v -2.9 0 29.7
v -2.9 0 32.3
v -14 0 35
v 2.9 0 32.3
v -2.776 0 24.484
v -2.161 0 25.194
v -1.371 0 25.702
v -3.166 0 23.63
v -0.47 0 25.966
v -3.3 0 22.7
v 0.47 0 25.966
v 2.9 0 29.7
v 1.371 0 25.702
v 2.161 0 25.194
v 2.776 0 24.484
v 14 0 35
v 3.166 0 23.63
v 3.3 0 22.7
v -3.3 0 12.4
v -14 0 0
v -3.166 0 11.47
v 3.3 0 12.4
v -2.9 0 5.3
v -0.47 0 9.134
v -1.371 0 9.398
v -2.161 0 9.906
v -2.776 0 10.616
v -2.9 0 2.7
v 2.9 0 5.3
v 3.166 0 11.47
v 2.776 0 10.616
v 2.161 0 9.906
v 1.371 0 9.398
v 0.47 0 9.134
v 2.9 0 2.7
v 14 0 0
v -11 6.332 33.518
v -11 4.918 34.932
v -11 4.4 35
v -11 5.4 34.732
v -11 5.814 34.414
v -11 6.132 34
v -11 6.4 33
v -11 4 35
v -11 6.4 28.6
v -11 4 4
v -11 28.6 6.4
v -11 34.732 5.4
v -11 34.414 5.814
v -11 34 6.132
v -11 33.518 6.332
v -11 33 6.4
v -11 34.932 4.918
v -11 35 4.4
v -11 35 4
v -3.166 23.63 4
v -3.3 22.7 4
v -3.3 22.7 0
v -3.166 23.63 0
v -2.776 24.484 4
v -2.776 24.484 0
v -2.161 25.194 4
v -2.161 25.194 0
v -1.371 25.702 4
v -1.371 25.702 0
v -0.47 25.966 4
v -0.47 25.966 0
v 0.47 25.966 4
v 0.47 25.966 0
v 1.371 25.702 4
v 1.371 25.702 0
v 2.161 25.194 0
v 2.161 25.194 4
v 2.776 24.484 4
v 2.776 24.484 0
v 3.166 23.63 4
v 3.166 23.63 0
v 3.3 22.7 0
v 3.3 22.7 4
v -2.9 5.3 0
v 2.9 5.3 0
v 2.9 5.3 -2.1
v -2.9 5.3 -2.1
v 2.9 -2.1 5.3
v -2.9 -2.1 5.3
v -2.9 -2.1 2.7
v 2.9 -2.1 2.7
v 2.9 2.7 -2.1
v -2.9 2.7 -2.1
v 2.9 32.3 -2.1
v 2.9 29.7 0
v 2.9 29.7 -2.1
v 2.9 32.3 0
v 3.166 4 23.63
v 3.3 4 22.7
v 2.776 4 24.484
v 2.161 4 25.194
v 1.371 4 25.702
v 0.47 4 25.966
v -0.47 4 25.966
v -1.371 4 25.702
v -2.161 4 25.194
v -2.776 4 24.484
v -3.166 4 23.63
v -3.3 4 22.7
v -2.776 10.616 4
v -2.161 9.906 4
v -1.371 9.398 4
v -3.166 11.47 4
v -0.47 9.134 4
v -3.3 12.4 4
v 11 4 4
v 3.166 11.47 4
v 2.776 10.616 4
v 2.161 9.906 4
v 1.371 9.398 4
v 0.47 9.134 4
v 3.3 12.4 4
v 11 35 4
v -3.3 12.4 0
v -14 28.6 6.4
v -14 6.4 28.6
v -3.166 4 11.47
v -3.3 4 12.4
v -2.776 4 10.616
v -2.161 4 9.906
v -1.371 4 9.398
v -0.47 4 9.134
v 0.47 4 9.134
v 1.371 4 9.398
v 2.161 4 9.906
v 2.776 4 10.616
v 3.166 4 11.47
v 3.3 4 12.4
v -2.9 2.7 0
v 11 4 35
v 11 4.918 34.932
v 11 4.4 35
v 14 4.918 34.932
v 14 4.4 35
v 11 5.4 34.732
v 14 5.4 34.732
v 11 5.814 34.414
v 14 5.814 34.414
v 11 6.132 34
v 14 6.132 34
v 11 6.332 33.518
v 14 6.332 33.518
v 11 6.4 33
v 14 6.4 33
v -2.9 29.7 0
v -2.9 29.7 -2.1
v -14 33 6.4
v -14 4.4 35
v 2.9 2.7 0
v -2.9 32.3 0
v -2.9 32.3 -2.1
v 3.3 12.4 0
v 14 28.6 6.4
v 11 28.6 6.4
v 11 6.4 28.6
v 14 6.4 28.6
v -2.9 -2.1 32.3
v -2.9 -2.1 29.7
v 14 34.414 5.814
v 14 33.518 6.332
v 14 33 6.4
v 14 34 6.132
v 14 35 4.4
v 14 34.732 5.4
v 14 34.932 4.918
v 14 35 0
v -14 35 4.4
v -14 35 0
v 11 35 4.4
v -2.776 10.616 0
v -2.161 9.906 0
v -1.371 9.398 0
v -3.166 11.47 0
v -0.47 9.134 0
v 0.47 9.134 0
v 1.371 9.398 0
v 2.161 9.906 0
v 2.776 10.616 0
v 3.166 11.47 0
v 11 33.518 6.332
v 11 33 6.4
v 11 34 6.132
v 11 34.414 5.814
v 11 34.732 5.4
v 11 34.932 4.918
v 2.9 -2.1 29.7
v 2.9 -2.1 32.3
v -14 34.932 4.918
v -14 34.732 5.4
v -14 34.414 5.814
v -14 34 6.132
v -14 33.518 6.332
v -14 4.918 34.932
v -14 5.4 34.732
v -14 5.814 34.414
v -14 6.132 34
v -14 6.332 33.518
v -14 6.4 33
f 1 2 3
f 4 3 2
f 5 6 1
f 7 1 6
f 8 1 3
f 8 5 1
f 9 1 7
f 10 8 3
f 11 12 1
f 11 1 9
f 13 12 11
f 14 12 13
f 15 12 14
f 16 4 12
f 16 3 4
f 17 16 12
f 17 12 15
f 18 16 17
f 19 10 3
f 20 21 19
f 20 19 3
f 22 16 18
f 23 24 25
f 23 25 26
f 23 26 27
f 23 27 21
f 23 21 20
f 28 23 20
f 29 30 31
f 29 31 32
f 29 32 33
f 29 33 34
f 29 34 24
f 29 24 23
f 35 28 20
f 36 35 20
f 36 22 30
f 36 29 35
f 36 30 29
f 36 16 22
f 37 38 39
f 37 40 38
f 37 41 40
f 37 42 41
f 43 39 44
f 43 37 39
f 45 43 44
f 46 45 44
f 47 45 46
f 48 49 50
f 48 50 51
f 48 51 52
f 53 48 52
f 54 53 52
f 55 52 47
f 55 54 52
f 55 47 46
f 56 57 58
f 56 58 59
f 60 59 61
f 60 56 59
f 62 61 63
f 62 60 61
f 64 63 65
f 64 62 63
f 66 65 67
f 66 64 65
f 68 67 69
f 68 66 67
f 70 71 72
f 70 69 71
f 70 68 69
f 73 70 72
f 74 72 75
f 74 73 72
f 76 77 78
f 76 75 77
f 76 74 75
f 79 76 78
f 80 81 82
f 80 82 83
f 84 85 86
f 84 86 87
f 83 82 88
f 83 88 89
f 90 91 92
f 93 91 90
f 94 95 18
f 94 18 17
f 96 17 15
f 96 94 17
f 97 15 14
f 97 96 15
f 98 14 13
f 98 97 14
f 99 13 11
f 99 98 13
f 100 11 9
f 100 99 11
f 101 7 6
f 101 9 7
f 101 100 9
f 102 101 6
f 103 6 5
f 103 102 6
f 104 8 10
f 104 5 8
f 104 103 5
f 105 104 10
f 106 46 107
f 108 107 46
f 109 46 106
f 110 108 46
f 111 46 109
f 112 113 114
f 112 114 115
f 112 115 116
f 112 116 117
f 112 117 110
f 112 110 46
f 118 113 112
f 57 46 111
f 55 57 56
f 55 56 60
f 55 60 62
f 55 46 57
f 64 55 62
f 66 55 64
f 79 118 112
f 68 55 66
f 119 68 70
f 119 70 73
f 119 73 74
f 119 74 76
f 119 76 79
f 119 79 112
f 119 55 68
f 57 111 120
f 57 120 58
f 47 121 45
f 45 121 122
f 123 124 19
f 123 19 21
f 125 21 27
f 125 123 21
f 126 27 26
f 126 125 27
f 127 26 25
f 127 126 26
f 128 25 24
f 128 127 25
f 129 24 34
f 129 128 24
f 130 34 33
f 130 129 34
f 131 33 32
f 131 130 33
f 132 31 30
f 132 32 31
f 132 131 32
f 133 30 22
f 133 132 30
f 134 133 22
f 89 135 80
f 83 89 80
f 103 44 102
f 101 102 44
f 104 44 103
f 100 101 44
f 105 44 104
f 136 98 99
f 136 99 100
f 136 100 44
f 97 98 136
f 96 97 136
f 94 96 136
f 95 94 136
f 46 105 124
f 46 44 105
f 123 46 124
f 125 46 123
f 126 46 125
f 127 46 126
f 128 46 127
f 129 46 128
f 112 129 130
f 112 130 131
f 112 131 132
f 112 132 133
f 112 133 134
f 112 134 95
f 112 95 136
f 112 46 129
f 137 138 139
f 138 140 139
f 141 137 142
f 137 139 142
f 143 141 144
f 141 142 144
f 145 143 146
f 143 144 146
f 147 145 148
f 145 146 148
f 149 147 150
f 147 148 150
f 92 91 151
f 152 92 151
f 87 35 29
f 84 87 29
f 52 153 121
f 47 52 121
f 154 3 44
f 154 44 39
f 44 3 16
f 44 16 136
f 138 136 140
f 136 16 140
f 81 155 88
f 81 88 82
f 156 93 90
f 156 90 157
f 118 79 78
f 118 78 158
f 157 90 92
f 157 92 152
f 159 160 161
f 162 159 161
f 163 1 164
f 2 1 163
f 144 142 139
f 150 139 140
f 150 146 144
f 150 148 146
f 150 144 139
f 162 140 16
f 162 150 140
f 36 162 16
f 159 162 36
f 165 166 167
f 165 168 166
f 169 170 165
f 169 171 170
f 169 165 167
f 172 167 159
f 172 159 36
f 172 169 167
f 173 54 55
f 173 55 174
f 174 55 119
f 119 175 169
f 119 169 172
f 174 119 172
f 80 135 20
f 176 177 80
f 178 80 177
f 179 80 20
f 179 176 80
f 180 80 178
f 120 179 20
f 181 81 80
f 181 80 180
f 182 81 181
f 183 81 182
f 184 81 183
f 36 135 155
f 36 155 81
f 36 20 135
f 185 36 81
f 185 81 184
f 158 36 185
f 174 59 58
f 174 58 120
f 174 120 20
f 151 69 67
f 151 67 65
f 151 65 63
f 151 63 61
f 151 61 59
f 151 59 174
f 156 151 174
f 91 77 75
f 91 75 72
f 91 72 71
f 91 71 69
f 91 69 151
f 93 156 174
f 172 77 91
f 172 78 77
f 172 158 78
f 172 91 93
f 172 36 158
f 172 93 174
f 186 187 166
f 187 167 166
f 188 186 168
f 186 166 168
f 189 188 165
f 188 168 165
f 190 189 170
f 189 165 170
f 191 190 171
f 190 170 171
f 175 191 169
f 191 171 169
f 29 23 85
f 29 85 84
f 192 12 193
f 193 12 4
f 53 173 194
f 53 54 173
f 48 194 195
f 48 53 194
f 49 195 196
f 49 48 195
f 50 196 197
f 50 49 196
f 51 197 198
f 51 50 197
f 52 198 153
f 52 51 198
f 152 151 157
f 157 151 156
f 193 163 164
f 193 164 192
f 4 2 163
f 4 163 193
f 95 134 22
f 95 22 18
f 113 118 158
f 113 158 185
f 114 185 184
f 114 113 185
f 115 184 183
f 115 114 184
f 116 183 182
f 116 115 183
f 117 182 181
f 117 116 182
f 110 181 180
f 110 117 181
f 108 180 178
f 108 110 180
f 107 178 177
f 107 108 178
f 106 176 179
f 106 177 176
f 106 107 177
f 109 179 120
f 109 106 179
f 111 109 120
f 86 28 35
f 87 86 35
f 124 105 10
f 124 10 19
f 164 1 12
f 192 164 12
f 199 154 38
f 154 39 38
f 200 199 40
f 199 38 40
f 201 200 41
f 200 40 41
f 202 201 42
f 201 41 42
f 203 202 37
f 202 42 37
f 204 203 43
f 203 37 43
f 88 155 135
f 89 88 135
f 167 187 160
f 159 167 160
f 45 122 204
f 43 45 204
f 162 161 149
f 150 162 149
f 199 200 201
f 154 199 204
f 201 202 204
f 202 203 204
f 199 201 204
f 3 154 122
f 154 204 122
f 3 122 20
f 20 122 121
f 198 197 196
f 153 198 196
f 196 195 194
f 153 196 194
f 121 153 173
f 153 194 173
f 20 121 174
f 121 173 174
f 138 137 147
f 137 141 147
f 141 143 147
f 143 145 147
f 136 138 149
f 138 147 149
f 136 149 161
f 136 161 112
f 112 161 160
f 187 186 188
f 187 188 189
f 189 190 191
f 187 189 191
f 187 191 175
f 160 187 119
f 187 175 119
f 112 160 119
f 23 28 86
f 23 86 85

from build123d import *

# Parameters (mm, degrees)
SKETCH1_W           = 35
SKETCH1_H           = 35
BOSS_EXTRUDE1_DEPTH = 14
CUT_EXTRUDE1_DEPTH  = 57.868268832
SKETCH3_W           = 22
SKETCH3_H           = 31
CUT_EXTRUDE2_DEPTH  = 31
CUT_EXTRUDE3_DEPTH  = 57.868268832
FILLET1_R           = 2
CUT_EXTRUDE4_DEPTH  = 49.805737368
CUT_EXTRUDE5_DEPTH  = 49.805737368
SKETCH7_W           = 5.8
SKETCH7_H           = 2.6
BOSS_EXTRUDE2_DEPTH = 2.1
SKETCH8_W           = 5.8
SKETCH8_H           = 2.6
BOSS_EXTRUDE3_DEPTH = 2.1


with BuildPart() as part:
    # Sketch1 → Boss-Extrude1 (new, symmetric)
    with BuildSketch(Plane(origin=(0, 0, 0), x_dir=(0, 0, -1), z_dir=(1, 0, 0))):
        with Locations((-17.5, 17.5)):
            Rectangle(SKETCH1_W, SKETCH1_H)
    extrude(amount=BOSS_EXTRUDE1_DEPTH, both=True)

    # Sketch2 → Cut-Extrude1 (cut, through all)
    with BuildSketch(Plane.ZY.offset(14)):
        Polygon((35, 35), (6.4, 35), (35, 6.4), align=None)
    extrude(amount=-CUT_EXTRUDE1_DEPTH, mode=Mode.SUBTRACT)

    # Sketch3 → Cut-Extrude2 (cut)
    with BuildSketch(Plane(origin=(0, 35, 0), x_dir=(1, 0, 0), z_dir=(0, 1, 0))):
        with Locations((0, -19.5)):
            Rectangle(SKETCH3_W, SKETCH3_H)
    extrude(amount=-CUT_EXTRUDE2_DEPTH, mode=Mode.SUBTRACT)

    # Sketch4 → Cut-Extrude3 (cut, through all)
    with BuildSketch(Plane.ZY.offset(14)):
        Polygon((6.4, 35), (6.4, 28.6), (28.6, 6.4), (35, 6.4), align=None)
    extrude(amount=-CUT_EXTRUDE3_DEPTH, mode=Mode.SUBTRACT)

    # Fillet1
    fillet1_edges = [part.edges().sort_by_distance(p)[0] for p in [
        (12.5, 6.4, 35),
        (12.5, 35, 6.4),
        (-12.5, 6.4, 35),
        (-12.5, 35, 6.4),
    ]]
    fillet(fillet1_edges, radius=FILLET1_R)

    # Sketch5 → Cut-Extrude4 (cut, through all)
    with BuildSketch(Plane.XY.offset(4)):
        with BuildLine():
            Line((-3.3, 12.4), (-3.3, 22.7))
            ThreePointArc((-3.3, 22.7), (0, 26), (3.3, 22.7))
            Line((3.3, 22.7), (3.3, 12.4))
            ThreePointArc((3.3, 12.4), (0, 9.1), (-3.3, 12.4))
        make_face()
    extrude(amount=-CUT_EXTRUDE4_DEPTH, mode=Mode.SUBTRACT)

    # Sketch6 → Cut-Extrude5 (cut, through all)
    with BuildSketch(Plane(origin=(0, 4, 0), x_dir=(1, 0, 0), z_dir=(0, 1, 0))):
        with BuildLine():
            Line((3.3, -12.4), (3.3, -22.7))
            ThreePointArc((3.3, -22.7), (0, -26), (-3.3, -22.7))
            Line((-3.3, -22.7), (-3.3, -12.4))
            ThreePointArc((-3.3, -12.4), (0, -9.1), (3.3, -12.4))
        make_face()
    extrude(amount=-CUT_EXTRUDE5_DEPTH, mode=Mode.SUBTRACT)

    # Sketch7 → Boss-Extrude2 (add)
    with BuildSketch(Plane(origin=(0, 0, 0), x_dir=(-1, 0, 0), z_dir=(0, 0, -1))):
        with Locations((0, 31)):
            Rectangle(SKETCH7_W, SKETCH7_H)
        with Locations((0, 4)):
            Rectangle(SKETCH7_W, SKETCH7_H)
    extrude(amount=BOSS_EXTRUDE2_DEPTH)

    # Sketch8 → Boss-Extrude3 (add)
    with BuildSketch(Plane.XZ):
        with Locations((0, 31)):
            Rectangle(SKETCH8_W, SKETCH8_H)
        with Locations((0, 4)):
            Rectangle(SKETCH8_W, SKETCH8_H)
    extrude(amount=BOSS_EXTRUDE3_DEPTH)


solid = part.part
